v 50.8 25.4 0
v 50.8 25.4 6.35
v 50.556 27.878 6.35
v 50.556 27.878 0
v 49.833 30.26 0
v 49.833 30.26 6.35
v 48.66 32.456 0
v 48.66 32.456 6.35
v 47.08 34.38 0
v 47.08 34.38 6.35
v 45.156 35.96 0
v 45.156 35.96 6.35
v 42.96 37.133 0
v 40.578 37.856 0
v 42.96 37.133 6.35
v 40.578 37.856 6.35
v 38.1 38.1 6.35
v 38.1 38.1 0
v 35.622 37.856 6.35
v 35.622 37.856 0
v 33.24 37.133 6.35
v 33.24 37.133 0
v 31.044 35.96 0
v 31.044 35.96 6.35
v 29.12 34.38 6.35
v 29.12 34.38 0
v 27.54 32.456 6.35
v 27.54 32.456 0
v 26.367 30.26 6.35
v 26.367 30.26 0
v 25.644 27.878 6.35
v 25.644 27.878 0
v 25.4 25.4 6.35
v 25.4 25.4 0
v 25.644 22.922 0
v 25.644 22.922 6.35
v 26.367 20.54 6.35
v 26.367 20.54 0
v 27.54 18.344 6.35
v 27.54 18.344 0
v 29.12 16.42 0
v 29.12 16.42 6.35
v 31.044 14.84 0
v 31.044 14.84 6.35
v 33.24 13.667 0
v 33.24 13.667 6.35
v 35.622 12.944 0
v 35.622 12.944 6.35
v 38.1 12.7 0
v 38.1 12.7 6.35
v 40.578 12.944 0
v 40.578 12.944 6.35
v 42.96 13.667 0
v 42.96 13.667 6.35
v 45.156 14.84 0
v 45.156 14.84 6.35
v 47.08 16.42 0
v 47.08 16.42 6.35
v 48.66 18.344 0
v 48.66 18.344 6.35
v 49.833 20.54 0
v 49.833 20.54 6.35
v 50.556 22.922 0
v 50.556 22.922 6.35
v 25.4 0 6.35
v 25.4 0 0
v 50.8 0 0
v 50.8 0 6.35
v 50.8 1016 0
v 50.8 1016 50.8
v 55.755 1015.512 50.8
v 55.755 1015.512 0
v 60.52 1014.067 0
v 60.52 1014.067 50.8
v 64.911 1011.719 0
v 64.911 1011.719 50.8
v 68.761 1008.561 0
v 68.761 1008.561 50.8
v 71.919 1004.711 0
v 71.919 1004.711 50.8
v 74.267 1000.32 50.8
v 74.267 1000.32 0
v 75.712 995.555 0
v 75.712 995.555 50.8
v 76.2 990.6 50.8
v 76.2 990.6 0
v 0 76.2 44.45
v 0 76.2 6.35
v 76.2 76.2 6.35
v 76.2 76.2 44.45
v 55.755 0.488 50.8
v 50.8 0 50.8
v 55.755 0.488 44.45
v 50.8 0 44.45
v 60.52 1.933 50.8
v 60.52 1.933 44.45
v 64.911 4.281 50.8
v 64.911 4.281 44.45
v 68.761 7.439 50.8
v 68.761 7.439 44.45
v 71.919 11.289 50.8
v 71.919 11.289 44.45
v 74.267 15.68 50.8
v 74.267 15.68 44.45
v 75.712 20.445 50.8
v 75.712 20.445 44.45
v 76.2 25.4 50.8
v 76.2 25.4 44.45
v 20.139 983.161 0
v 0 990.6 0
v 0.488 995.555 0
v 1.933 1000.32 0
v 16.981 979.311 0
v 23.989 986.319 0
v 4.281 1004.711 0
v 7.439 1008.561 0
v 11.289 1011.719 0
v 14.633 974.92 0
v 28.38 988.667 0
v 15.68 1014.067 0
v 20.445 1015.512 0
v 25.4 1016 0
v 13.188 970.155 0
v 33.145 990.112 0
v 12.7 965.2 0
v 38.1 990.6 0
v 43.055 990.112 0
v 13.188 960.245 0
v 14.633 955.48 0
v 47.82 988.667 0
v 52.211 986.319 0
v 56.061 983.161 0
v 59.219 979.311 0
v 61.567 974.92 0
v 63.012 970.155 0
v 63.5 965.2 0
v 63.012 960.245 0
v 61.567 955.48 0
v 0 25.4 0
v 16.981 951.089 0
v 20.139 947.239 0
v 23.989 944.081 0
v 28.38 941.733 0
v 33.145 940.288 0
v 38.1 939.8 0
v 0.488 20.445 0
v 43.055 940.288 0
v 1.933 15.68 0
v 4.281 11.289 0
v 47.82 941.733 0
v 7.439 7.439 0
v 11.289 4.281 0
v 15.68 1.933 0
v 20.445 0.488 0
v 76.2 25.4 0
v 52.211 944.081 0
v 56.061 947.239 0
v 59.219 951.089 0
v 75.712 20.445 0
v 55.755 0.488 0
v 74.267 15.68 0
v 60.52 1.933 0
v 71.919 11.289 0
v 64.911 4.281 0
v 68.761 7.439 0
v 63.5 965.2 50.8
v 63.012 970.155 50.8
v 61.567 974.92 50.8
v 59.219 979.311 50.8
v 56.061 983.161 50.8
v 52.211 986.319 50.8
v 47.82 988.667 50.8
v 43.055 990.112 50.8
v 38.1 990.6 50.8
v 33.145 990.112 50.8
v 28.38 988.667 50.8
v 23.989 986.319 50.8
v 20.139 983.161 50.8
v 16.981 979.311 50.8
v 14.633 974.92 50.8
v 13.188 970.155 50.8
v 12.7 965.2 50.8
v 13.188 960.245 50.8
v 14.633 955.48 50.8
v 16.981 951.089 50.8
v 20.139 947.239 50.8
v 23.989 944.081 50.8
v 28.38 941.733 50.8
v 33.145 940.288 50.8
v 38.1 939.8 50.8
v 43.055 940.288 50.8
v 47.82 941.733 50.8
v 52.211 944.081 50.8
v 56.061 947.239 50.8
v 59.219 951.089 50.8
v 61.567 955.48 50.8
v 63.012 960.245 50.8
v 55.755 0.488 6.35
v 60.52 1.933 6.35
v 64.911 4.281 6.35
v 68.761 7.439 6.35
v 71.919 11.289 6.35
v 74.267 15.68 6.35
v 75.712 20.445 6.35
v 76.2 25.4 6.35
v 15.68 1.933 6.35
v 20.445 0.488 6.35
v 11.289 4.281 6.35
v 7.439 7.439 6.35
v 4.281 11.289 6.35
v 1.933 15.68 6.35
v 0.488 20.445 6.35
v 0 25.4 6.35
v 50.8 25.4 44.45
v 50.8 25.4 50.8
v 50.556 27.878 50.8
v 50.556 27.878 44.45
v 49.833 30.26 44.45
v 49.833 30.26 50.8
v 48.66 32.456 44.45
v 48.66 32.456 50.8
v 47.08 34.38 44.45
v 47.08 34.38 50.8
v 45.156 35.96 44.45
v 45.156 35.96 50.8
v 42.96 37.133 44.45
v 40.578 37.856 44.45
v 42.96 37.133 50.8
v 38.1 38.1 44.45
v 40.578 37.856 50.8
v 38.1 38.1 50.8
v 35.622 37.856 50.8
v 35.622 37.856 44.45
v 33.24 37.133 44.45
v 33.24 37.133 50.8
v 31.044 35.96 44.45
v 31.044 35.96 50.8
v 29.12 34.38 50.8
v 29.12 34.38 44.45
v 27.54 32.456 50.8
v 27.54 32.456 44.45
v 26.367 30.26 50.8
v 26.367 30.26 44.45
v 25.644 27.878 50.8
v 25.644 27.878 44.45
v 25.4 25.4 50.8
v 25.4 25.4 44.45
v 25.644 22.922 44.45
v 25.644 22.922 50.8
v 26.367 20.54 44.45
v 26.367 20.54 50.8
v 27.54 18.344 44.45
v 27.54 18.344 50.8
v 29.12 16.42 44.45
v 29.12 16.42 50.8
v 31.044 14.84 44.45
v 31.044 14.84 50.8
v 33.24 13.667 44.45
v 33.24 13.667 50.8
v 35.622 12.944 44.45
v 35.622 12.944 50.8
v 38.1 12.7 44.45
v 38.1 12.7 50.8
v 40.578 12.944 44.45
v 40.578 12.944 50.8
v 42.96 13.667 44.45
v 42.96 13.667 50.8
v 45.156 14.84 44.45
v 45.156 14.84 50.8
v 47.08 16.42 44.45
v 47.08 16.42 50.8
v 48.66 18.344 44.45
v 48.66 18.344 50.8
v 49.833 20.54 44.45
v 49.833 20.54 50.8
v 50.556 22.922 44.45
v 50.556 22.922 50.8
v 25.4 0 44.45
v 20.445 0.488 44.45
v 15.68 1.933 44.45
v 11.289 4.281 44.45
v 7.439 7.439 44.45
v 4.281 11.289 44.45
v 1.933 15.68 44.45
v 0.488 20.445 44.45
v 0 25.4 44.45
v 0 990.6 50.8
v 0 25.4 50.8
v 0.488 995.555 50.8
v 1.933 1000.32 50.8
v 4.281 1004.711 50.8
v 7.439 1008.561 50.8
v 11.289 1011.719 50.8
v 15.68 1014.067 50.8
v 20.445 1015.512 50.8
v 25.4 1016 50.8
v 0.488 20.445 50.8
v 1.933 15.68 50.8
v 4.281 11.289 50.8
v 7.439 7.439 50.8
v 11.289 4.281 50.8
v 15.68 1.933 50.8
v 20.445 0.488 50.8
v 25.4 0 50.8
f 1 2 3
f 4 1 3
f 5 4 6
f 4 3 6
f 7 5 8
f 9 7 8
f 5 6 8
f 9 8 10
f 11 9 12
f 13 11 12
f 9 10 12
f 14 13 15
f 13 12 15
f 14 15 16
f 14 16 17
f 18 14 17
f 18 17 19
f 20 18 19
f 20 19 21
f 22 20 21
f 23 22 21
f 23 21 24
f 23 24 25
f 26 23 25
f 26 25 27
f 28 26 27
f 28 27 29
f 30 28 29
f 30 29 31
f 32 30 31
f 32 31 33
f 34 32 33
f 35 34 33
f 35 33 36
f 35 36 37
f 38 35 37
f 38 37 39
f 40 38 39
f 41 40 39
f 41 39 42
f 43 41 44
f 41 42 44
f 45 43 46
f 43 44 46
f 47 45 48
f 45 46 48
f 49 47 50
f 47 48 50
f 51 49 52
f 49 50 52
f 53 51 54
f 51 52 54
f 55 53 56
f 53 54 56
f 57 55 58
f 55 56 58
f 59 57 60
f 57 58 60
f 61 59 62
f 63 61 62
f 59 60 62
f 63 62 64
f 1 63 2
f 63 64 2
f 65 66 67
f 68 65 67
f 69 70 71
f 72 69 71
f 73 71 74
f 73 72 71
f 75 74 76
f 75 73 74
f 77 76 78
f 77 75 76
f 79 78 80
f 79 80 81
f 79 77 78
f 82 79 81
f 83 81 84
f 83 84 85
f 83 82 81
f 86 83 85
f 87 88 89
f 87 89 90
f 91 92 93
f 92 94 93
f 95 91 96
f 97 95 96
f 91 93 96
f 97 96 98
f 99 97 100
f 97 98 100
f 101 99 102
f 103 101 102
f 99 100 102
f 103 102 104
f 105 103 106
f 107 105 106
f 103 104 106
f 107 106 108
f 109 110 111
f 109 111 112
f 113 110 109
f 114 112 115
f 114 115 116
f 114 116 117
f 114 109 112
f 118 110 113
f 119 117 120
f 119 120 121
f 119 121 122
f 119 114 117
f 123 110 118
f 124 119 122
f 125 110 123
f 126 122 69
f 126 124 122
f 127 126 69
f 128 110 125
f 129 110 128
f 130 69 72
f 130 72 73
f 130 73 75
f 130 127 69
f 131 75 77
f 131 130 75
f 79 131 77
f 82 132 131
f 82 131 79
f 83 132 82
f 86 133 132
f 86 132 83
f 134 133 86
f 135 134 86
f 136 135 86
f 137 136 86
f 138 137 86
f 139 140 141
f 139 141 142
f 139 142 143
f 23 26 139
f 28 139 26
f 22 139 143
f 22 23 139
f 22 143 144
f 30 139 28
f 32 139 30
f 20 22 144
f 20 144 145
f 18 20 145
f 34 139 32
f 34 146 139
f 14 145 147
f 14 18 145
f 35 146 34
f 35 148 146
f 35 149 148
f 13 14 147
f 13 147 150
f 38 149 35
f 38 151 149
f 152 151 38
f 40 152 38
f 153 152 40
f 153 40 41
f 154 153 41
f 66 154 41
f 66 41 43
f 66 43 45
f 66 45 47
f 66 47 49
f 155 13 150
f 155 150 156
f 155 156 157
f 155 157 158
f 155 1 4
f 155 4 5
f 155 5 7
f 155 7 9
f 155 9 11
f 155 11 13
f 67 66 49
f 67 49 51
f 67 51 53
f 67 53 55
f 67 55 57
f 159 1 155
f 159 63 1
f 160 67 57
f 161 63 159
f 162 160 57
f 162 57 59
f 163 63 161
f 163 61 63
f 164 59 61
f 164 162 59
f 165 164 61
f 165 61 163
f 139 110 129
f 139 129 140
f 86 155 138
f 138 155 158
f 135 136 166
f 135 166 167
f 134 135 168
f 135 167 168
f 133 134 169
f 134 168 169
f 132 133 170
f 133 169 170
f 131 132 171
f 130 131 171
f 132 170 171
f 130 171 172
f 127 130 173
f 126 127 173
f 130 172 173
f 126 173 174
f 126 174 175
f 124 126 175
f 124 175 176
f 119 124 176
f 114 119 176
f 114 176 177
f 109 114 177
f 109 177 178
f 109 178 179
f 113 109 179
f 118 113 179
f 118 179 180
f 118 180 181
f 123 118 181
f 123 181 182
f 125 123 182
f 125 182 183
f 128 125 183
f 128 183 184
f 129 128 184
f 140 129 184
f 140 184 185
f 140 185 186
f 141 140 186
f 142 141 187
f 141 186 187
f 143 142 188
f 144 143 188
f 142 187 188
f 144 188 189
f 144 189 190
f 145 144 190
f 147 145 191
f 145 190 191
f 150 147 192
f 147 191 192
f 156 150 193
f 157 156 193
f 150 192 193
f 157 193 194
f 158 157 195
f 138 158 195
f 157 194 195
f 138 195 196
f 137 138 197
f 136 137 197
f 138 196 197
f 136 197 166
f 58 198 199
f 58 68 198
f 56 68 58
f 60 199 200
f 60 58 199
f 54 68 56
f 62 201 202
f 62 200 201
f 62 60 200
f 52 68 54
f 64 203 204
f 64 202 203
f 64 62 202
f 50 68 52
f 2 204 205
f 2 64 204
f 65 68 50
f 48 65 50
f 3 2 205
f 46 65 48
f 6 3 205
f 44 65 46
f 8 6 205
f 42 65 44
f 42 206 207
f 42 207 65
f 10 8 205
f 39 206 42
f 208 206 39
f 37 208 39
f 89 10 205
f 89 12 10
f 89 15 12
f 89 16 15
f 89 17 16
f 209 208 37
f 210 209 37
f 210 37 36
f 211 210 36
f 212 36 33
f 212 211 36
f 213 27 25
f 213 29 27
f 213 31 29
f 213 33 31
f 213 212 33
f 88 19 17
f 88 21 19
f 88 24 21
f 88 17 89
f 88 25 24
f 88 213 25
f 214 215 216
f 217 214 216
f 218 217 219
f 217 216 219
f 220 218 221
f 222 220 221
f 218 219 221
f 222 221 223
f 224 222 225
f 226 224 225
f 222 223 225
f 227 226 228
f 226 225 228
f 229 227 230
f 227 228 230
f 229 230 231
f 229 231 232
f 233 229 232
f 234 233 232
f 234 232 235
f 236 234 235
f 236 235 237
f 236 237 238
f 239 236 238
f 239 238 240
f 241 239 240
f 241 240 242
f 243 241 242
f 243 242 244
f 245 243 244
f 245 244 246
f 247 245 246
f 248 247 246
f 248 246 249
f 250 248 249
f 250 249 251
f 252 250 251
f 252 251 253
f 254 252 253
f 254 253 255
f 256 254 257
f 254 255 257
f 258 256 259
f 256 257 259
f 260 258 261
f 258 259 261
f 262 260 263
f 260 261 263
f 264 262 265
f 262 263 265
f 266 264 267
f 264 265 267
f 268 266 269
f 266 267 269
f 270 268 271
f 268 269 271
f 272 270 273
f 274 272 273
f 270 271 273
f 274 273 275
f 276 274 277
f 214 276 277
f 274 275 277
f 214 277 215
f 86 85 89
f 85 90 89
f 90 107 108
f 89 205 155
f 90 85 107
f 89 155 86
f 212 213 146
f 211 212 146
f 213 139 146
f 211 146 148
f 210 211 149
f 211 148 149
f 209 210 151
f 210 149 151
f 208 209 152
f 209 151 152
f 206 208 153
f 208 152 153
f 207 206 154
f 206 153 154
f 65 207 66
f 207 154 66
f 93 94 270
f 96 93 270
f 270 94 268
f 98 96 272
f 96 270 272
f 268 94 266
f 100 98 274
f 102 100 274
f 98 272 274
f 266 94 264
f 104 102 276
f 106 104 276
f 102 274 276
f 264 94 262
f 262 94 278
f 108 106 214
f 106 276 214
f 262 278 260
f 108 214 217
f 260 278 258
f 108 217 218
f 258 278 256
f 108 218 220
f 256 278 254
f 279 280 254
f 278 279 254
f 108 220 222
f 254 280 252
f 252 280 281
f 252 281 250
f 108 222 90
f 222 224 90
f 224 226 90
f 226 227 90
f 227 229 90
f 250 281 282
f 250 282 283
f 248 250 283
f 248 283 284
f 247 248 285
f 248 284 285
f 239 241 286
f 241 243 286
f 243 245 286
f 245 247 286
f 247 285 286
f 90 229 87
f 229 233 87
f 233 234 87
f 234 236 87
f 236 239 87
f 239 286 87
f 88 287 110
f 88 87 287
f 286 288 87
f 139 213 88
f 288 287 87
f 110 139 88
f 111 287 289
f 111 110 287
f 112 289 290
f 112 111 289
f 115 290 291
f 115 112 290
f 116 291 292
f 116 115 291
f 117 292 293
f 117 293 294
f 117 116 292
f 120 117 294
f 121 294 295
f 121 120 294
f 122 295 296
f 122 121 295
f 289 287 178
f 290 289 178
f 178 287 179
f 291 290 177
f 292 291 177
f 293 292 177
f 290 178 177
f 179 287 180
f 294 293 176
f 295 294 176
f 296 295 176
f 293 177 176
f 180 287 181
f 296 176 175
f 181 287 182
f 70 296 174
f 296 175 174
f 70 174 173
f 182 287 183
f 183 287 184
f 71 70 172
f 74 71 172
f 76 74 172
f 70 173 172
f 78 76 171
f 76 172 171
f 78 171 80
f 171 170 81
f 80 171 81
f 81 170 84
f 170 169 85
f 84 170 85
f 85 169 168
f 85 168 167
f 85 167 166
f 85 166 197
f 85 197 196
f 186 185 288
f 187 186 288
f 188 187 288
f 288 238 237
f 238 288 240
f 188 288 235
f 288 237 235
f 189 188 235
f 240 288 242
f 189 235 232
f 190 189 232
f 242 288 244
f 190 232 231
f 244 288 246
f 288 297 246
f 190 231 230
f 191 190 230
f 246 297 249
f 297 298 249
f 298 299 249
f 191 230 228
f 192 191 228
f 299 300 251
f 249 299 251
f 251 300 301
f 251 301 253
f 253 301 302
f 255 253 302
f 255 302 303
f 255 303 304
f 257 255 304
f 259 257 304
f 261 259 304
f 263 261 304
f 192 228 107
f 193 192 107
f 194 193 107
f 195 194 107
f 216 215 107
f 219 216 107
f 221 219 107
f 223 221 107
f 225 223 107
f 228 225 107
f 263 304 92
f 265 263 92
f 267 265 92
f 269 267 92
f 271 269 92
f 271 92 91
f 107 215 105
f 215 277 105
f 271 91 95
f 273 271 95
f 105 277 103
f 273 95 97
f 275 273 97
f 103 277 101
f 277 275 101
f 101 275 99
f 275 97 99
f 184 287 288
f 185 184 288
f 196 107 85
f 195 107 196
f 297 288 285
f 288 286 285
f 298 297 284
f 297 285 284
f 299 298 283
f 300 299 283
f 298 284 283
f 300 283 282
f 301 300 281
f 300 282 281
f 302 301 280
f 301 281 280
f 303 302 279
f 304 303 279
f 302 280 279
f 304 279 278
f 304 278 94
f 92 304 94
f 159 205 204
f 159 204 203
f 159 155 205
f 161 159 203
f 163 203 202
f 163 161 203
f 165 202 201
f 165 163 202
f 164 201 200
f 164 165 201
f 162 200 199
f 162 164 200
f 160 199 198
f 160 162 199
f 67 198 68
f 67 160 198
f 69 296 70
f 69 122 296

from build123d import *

# Parameters (mm, degrees)
SKETCH1_W           = 76.2
SKETCH1_H           = 50.8
BOSS_EXTRUDE2_DEPTH = 1016
SKETCH2_R           = 25.4
CUT_EXTRUDE1_DEPTH  = 1016
FILLET1_R           = 25.4
SKETCH3_R           = 12.7
CUT_EXTRUDE2_DEPTH  = 254
SKETCH4_W           = 38.1
SKETCH4_H           = 50.8
CUT_EXTRUDE3_DEPTH  = 254
SKETCH5_W           = 38.1
SKETCH5_H           = 25.4
CUT_EXTRUDE4_DEPTH  = 254
FILLET2_R           = 25.4


with BuildPart() as part:
    # Sketch1 → Boss-Extrude2 (new body)
    with BuildSketch(Plane(origin=(0, 0, 0), x_dir=(1, 0, 0), z_dir=(0, 1, 0))):
        with Locations((38.1, -25.4)):
            Rectangle(SKETCH1_W, SKETCH1_H)
    extrude(amount=BOSS_EXTRUDE2_DEPTH)

    # Sketch2 → Cut-Extrude1 (cut)
    with BuildSketch(Plane.XY.offset(50.8)):
        with Locations((38.1, 965.2)):
            Circle(SKETCH2_R)
    extrude(amount=-CUT_EXTRUDE1_DEPTH, mode=Mode.SUBTRACT)

    # Fillet1
    fillet1_edges = [part.edges().sort_by_distance(p)[0] for p in [
        (76.2, 1016, 25.4),
        (0, 1016, 25.4),
    ]]
    fillet(fillet1_edges, radius=FILLET1_R)

    # Sketch3 → Cut-Extrude2 (cut)
    with BuildSketch(Plane.XY.offset(50.8)):
        with Locations((38.1, 25.4)):
            Circle(SKETCH3_R)
    extrude(amount=-CUT_EXTRUDE2_DEPTH, mode=Mode.SUBTRACT)

    # Sketch4 → Cut-Extrude3 (cut)
    with BuildSketch(Plane.ZY):
        with Locations((25.4, 25.4)):
            Rectangle(SKETCH4_W, SKETCH4_H)
    extrude(amount=-CUT_EXTRUDE3_DEPTH, mode=Mode.SUBTRACT)

    # Sketch5 → Cut-Extrude4 (cut)
    with BuildSketch(Plane.ZY):
        with Locations((25.4, 63.5)):
            Rectangle(SKETCH5_W, SKETCH5_H)
    extrude(amount=-CUT_EXTRUDE4_DEPTH, mode=Mode.SUBTRACT)

    # Fillet2
    fillet2_edges = [part.edges().sort_by_distance(p)[0] for p in [
        (0, 0, 47.625),
        (76.2, 0, 3.175),
        (76.2, 0, 47.625),
        (0, 0, 3.175),
    ]]
    fillet(fillet2_edges, radius=FILLET2_R)


solid = part.part
